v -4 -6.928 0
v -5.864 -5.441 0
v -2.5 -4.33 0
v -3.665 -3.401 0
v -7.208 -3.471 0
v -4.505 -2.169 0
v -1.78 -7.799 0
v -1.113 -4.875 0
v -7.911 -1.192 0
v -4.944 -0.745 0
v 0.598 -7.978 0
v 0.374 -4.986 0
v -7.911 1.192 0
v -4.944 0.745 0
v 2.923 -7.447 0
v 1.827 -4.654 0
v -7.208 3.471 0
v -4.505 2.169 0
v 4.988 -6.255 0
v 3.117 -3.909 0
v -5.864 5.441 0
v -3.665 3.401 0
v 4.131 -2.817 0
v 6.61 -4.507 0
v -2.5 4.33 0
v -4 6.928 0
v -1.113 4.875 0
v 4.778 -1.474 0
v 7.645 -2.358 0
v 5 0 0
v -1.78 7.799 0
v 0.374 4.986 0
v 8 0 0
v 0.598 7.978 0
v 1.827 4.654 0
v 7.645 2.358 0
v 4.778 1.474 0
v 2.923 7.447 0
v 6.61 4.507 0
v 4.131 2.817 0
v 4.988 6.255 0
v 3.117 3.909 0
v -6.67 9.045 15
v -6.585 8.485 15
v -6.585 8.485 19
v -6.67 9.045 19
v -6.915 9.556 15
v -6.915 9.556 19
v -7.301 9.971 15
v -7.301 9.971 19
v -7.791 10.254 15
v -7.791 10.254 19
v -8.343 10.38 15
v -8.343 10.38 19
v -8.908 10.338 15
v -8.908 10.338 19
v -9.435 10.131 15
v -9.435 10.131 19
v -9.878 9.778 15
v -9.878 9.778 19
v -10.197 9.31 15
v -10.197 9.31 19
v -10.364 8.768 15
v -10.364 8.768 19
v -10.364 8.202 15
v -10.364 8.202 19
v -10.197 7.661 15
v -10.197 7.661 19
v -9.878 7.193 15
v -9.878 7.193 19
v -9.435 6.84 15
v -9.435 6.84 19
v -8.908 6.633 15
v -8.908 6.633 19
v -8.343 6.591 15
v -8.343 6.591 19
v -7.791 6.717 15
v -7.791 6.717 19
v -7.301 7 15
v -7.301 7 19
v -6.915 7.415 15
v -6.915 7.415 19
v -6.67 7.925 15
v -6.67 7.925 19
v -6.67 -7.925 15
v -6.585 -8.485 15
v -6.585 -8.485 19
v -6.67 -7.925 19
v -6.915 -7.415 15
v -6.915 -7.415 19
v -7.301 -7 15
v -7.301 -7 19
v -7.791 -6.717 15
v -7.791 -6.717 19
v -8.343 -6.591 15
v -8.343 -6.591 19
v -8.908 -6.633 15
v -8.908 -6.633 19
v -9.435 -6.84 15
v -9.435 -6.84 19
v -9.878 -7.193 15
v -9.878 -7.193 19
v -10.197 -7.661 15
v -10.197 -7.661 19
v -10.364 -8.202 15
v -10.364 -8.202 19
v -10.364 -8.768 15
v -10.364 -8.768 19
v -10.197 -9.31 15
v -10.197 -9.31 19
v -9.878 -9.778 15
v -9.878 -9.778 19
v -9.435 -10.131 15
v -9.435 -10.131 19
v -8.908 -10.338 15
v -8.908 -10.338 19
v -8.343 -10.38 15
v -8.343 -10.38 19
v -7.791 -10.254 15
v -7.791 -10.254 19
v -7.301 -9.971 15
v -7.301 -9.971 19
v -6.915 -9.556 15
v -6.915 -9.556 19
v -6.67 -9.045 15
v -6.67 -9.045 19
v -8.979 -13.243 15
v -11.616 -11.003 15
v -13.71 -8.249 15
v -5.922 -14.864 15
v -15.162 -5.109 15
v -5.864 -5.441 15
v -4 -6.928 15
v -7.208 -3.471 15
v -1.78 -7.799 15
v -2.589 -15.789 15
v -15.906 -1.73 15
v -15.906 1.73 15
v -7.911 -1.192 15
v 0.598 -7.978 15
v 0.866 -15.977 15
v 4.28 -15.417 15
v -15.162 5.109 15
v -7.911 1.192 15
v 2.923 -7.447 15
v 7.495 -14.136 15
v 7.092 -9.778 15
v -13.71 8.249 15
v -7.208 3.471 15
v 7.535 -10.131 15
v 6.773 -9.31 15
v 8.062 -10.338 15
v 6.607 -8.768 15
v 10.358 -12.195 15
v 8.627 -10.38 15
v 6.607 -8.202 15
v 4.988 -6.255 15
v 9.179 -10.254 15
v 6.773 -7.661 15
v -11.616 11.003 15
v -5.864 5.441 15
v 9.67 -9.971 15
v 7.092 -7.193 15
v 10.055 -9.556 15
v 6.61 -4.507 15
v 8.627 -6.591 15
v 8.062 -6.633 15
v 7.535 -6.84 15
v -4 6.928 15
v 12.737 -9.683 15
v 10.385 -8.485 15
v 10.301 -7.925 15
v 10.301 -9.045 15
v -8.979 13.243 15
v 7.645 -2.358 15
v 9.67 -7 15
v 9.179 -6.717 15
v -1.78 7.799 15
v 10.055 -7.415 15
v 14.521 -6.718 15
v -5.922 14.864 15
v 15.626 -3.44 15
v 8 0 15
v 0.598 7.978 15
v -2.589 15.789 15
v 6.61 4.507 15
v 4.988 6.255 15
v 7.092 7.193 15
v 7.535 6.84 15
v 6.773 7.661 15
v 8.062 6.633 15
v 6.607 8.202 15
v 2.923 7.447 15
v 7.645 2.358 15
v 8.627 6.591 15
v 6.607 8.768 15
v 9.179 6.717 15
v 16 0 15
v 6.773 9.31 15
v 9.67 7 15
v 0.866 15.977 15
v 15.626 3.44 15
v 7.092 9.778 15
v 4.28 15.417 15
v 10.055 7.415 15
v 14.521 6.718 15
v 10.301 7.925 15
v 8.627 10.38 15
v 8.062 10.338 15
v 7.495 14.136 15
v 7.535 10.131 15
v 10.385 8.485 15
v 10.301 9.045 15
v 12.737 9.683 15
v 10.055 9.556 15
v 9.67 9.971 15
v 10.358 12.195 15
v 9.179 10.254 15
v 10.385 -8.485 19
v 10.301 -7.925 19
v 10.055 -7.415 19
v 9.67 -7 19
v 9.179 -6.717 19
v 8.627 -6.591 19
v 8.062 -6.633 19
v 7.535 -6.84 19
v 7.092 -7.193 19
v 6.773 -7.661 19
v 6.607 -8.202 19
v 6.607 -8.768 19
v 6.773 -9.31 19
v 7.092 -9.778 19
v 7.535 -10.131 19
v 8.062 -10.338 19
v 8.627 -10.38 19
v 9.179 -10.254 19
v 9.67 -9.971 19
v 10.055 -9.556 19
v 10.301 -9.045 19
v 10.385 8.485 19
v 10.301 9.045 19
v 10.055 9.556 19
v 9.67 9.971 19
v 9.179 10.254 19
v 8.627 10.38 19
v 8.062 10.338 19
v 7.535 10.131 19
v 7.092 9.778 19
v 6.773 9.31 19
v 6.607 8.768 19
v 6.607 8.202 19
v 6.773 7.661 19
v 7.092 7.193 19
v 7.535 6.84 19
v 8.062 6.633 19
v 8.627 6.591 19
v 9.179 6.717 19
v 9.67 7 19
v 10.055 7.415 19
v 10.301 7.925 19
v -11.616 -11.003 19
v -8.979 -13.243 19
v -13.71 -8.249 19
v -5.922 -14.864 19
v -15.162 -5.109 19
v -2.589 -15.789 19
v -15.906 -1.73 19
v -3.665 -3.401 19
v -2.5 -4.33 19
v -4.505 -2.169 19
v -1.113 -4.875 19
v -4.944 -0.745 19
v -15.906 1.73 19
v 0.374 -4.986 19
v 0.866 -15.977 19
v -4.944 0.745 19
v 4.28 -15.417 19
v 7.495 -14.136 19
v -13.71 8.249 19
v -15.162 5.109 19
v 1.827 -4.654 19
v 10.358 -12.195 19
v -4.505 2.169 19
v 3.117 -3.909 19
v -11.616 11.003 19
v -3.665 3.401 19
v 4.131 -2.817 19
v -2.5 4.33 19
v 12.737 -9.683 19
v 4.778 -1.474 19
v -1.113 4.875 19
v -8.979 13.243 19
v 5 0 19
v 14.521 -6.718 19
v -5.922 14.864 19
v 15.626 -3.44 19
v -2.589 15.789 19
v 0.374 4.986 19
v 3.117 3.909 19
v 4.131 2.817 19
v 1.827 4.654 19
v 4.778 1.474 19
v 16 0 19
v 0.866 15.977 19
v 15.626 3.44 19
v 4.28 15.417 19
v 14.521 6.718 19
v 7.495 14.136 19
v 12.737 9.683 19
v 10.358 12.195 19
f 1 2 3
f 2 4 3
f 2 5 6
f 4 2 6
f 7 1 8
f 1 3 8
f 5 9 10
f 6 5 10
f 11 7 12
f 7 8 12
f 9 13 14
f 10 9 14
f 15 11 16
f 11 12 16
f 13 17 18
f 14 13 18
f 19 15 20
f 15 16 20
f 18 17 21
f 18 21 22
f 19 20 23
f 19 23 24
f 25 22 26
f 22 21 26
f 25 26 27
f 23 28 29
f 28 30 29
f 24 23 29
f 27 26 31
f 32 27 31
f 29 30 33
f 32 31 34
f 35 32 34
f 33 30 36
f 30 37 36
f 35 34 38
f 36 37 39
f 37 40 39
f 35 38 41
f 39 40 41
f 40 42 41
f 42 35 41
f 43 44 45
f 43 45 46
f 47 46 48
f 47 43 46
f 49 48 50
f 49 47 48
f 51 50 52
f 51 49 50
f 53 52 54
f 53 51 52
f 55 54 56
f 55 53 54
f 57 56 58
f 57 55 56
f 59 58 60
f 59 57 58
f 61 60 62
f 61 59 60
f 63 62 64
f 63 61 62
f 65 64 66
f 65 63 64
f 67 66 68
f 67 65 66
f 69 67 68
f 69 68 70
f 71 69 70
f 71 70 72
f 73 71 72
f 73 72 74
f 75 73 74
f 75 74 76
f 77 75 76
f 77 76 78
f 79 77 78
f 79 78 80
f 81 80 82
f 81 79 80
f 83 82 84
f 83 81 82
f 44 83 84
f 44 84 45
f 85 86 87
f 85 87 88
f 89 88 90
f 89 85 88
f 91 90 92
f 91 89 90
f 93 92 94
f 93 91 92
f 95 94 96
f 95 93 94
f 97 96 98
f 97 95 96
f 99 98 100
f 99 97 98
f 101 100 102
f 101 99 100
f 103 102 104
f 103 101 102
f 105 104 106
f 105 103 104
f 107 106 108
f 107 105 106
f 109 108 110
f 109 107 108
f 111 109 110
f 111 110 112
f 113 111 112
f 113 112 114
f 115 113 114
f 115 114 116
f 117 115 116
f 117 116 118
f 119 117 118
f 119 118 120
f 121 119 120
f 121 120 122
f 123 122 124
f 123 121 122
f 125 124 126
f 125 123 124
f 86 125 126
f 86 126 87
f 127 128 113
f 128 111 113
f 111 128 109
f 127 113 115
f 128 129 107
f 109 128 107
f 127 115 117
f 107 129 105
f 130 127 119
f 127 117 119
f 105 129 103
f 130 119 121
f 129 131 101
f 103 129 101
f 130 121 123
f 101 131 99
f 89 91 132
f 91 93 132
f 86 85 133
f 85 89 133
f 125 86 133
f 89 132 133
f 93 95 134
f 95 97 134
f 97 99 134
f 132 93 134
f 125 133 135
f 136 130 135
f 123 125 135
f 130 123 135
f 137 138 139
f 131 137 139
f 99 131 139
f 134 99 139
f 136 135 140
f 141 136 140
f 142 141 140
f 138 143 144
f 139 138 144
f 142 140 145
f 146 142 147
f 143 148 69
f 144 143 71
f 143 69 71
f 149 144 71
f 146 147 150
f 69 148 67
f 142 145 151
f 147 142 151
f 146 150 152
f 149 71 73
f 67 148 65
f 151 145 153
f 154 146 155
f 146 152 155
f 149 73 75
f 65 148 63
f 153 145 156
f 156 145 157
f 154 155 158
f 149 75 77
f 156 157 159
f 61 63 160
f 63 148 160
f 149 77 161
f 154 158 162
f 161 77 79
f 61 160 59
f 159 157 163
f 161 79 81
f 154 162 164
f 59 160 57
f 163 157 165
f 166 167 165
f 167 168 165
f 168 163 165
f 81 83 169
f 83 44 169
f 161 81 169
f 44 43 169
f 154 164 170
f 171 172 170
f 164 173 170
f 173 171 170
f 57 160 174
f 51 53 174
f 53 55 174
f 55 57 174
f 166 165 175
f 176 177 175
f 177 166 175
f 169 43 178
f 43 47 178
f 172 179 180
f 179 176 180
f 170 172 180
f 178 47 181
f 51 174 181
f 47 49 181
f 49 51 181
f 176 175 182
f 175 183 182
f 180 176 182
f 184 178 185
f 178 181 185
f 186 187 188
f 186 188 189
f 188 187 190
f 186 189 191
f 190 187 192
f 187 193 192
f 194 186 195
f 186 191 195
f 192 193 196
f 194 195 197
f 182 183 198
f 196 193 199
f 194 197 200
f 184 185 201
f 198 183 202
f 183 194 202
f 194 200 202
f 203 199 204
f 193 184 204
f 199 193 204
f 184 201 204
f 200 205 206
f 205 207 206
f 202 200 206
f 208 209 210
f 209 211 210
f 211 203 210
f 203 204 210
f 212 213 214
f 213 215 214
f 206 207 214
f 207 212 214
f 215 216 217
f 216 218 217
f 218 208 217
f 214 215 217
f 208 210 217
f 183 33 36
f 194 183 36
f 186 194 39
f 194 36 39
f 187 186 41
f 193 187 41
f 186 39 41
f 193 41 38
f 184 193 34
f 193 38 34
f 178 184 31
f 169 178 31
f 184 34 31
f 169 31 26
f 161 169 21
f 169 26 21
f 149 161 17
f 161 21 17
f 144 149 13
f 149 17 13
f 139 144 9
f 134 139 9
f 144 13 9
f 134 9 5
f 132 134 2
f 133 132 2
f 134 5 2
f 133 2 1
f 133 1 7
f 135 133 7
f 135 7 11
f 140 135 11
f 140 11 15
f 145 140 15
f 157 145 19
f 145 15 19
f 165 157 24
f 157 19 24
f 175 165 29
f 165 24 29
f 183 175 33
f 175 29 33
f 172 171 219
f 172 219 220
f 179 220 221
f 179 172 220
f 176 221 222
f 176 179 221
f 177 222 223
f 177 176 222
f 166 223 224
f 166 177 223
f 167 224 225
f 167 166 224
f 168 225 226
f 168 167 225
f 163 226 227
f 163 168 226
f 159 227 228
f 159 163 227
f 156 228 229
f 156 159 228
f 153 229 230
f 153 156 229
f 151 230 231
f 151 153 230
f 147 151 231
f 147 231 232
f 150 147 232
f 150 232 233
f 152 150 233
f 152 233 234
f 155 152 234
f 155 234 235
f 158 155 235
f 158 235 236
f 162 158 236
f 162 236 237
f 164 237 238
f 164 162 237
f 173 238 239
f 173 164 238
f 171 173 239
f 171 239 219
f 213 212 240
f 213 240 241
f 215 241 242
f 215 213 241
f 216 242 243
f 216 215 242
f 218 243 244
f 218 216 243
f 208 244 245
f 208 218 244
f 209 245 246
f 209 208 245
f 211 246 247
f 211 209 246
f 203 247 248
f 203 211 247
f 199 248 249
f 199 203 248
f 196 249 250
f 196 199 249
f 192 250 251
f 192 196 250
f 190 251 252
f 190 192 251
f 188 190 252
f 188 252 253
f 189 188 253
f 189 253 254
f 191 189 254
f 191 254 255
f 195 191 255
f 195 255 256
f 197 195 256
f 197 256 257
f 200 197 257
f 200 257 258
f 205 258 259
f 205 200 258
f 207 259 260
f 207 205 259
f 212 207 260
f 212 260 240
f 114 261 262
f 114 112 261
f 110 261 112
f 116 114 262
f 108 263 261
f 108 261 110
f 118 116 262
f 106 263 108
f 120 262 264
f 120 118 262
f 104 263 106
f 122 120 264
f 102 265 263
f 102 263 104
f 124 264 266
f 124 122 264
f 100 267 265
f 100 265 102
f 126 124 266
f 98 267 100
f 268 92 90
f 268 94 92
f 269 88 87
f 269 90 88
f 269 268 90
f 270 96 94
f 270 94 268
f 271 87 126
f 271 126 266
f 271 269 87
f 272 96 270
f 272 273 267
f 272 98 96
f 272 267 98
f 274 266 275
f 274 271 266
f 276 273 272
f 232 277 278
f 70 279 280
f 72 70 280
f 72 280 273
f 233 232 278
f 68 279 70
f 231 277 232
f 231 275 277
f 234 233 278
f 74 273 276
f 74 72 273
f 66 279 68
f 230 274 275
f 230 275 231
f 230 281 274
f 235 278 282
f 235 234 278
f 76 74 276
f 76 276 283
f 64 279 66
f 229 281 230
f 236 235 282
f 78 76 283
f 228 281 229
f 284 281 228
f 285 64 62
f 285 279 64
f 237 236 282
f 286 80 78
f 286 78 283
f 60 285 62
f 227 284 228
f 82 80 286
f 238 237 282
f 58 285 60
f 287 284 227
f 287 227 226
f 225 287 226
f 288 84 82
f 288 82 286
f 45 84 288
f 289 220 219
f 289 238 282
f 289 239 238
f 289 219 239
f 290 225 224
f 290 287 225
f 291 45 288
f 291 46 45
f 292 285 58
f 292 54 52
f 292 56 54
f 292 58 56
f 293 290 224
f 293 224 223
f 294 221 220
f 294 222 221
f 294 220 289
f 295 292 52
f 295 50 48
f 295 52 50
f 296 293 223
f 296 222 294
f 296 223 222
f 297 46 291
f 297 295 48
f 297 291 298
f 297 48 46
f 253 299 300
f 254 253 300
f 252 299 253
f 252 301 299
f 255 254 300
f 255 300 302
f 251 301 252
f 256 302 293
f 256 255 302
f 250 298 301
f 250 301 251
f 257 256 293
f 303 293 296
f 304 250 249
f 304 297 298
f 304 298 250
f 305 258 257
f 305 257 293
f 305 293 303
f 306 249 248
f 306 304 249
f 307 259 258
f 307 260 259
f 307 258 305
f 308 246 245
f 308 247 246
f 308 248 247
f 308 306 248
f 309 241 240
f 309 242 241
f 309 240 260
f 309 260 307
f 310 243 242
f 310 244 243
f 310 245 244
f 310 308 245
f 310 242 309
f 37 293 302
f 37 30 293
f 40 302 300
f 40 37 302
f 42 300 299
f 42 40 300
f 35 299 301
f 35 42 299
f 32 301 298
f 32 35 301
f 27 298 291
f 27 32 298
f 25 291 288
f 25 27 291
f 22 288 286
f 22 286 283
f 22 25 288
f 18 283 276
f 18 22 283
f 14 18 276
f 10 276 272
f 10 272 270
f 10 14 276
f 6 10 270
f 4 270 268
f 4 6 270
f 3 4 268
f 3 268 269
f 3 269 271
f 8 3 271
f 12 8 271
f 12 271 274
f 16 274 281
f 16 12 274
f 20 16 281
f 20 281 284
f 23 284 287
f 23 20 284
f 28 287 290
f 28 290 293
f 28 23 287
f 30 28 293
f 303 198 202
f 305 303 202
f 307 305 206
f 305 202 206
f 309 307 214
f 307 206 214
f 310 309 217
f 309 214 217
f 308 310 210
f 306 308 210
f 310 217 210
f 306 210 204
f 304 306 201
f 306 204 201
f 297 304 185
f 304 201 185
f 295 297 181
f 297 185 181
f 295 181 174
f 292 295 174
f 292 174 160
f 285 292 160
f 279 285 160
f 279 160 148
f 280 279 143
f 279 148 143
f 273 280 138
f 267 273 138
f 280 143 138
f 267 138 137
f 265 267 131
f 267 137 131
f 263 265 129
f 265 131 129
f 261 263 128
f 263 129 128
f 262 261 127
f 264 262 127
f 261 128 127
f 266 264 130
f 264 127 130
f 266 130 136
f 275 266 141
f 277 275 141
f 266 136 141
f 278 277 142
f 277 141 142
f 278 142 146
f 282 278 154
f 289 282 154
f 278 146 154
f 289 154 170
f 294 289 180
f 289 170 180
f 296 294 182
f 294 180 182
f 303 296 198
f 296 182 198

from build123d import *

# Parameters (mm, degrees)
SKETCH1_R      = 8
SKETCH1_R_2    = 5
EXTRUDE1_DEPTH = 15
SKETCH2_R      = 16
SKETCH2_R_2    = 5
SKETCH2_R_3    = 1.9
EXTRUDE2_DEPTH = 4


with BuildPart() as part:
    # Sketch1 → Extrude1 (new body)
    with BuildSketch(Plane.XY):
        Circle(SKETCH1_R)
        Circle(SKETCH1_R_2, mode=Mode.SUBTRACT)
    extrude(amount=EXTRUDE1_DEPTH)

    # Sketch2 → Extrude2 (add)
    with BuildSketch(Plane.XY.offset(15)):
        Circle(SKETCH2_R)
        Circle(SKETCH2_R_2, mode=Mode.SUBTRACT)
        with Locations((-8.485281374, 8.485281374)):
            Circle(SKETCH2_R_3, mode=Mode.SUBTRACT)
        with Locations((8.485281374, 8.485281374)):
            Circle(SKETCH2_R_3, mode=Mode.SUBTRACT)
        with Locations((-8.485281374, -8.485281374)):
            Circle(SKETCH2_R_3, mode=Mode.SUBTRACT)
        with Locations((8.485281374, -8.485281374)):
            Circle(SKETCH2_R_3, mode=Mode.SUBTRACT)
    extrude(amount=EXTRUDE2_DEPTH)


solid = part.part
